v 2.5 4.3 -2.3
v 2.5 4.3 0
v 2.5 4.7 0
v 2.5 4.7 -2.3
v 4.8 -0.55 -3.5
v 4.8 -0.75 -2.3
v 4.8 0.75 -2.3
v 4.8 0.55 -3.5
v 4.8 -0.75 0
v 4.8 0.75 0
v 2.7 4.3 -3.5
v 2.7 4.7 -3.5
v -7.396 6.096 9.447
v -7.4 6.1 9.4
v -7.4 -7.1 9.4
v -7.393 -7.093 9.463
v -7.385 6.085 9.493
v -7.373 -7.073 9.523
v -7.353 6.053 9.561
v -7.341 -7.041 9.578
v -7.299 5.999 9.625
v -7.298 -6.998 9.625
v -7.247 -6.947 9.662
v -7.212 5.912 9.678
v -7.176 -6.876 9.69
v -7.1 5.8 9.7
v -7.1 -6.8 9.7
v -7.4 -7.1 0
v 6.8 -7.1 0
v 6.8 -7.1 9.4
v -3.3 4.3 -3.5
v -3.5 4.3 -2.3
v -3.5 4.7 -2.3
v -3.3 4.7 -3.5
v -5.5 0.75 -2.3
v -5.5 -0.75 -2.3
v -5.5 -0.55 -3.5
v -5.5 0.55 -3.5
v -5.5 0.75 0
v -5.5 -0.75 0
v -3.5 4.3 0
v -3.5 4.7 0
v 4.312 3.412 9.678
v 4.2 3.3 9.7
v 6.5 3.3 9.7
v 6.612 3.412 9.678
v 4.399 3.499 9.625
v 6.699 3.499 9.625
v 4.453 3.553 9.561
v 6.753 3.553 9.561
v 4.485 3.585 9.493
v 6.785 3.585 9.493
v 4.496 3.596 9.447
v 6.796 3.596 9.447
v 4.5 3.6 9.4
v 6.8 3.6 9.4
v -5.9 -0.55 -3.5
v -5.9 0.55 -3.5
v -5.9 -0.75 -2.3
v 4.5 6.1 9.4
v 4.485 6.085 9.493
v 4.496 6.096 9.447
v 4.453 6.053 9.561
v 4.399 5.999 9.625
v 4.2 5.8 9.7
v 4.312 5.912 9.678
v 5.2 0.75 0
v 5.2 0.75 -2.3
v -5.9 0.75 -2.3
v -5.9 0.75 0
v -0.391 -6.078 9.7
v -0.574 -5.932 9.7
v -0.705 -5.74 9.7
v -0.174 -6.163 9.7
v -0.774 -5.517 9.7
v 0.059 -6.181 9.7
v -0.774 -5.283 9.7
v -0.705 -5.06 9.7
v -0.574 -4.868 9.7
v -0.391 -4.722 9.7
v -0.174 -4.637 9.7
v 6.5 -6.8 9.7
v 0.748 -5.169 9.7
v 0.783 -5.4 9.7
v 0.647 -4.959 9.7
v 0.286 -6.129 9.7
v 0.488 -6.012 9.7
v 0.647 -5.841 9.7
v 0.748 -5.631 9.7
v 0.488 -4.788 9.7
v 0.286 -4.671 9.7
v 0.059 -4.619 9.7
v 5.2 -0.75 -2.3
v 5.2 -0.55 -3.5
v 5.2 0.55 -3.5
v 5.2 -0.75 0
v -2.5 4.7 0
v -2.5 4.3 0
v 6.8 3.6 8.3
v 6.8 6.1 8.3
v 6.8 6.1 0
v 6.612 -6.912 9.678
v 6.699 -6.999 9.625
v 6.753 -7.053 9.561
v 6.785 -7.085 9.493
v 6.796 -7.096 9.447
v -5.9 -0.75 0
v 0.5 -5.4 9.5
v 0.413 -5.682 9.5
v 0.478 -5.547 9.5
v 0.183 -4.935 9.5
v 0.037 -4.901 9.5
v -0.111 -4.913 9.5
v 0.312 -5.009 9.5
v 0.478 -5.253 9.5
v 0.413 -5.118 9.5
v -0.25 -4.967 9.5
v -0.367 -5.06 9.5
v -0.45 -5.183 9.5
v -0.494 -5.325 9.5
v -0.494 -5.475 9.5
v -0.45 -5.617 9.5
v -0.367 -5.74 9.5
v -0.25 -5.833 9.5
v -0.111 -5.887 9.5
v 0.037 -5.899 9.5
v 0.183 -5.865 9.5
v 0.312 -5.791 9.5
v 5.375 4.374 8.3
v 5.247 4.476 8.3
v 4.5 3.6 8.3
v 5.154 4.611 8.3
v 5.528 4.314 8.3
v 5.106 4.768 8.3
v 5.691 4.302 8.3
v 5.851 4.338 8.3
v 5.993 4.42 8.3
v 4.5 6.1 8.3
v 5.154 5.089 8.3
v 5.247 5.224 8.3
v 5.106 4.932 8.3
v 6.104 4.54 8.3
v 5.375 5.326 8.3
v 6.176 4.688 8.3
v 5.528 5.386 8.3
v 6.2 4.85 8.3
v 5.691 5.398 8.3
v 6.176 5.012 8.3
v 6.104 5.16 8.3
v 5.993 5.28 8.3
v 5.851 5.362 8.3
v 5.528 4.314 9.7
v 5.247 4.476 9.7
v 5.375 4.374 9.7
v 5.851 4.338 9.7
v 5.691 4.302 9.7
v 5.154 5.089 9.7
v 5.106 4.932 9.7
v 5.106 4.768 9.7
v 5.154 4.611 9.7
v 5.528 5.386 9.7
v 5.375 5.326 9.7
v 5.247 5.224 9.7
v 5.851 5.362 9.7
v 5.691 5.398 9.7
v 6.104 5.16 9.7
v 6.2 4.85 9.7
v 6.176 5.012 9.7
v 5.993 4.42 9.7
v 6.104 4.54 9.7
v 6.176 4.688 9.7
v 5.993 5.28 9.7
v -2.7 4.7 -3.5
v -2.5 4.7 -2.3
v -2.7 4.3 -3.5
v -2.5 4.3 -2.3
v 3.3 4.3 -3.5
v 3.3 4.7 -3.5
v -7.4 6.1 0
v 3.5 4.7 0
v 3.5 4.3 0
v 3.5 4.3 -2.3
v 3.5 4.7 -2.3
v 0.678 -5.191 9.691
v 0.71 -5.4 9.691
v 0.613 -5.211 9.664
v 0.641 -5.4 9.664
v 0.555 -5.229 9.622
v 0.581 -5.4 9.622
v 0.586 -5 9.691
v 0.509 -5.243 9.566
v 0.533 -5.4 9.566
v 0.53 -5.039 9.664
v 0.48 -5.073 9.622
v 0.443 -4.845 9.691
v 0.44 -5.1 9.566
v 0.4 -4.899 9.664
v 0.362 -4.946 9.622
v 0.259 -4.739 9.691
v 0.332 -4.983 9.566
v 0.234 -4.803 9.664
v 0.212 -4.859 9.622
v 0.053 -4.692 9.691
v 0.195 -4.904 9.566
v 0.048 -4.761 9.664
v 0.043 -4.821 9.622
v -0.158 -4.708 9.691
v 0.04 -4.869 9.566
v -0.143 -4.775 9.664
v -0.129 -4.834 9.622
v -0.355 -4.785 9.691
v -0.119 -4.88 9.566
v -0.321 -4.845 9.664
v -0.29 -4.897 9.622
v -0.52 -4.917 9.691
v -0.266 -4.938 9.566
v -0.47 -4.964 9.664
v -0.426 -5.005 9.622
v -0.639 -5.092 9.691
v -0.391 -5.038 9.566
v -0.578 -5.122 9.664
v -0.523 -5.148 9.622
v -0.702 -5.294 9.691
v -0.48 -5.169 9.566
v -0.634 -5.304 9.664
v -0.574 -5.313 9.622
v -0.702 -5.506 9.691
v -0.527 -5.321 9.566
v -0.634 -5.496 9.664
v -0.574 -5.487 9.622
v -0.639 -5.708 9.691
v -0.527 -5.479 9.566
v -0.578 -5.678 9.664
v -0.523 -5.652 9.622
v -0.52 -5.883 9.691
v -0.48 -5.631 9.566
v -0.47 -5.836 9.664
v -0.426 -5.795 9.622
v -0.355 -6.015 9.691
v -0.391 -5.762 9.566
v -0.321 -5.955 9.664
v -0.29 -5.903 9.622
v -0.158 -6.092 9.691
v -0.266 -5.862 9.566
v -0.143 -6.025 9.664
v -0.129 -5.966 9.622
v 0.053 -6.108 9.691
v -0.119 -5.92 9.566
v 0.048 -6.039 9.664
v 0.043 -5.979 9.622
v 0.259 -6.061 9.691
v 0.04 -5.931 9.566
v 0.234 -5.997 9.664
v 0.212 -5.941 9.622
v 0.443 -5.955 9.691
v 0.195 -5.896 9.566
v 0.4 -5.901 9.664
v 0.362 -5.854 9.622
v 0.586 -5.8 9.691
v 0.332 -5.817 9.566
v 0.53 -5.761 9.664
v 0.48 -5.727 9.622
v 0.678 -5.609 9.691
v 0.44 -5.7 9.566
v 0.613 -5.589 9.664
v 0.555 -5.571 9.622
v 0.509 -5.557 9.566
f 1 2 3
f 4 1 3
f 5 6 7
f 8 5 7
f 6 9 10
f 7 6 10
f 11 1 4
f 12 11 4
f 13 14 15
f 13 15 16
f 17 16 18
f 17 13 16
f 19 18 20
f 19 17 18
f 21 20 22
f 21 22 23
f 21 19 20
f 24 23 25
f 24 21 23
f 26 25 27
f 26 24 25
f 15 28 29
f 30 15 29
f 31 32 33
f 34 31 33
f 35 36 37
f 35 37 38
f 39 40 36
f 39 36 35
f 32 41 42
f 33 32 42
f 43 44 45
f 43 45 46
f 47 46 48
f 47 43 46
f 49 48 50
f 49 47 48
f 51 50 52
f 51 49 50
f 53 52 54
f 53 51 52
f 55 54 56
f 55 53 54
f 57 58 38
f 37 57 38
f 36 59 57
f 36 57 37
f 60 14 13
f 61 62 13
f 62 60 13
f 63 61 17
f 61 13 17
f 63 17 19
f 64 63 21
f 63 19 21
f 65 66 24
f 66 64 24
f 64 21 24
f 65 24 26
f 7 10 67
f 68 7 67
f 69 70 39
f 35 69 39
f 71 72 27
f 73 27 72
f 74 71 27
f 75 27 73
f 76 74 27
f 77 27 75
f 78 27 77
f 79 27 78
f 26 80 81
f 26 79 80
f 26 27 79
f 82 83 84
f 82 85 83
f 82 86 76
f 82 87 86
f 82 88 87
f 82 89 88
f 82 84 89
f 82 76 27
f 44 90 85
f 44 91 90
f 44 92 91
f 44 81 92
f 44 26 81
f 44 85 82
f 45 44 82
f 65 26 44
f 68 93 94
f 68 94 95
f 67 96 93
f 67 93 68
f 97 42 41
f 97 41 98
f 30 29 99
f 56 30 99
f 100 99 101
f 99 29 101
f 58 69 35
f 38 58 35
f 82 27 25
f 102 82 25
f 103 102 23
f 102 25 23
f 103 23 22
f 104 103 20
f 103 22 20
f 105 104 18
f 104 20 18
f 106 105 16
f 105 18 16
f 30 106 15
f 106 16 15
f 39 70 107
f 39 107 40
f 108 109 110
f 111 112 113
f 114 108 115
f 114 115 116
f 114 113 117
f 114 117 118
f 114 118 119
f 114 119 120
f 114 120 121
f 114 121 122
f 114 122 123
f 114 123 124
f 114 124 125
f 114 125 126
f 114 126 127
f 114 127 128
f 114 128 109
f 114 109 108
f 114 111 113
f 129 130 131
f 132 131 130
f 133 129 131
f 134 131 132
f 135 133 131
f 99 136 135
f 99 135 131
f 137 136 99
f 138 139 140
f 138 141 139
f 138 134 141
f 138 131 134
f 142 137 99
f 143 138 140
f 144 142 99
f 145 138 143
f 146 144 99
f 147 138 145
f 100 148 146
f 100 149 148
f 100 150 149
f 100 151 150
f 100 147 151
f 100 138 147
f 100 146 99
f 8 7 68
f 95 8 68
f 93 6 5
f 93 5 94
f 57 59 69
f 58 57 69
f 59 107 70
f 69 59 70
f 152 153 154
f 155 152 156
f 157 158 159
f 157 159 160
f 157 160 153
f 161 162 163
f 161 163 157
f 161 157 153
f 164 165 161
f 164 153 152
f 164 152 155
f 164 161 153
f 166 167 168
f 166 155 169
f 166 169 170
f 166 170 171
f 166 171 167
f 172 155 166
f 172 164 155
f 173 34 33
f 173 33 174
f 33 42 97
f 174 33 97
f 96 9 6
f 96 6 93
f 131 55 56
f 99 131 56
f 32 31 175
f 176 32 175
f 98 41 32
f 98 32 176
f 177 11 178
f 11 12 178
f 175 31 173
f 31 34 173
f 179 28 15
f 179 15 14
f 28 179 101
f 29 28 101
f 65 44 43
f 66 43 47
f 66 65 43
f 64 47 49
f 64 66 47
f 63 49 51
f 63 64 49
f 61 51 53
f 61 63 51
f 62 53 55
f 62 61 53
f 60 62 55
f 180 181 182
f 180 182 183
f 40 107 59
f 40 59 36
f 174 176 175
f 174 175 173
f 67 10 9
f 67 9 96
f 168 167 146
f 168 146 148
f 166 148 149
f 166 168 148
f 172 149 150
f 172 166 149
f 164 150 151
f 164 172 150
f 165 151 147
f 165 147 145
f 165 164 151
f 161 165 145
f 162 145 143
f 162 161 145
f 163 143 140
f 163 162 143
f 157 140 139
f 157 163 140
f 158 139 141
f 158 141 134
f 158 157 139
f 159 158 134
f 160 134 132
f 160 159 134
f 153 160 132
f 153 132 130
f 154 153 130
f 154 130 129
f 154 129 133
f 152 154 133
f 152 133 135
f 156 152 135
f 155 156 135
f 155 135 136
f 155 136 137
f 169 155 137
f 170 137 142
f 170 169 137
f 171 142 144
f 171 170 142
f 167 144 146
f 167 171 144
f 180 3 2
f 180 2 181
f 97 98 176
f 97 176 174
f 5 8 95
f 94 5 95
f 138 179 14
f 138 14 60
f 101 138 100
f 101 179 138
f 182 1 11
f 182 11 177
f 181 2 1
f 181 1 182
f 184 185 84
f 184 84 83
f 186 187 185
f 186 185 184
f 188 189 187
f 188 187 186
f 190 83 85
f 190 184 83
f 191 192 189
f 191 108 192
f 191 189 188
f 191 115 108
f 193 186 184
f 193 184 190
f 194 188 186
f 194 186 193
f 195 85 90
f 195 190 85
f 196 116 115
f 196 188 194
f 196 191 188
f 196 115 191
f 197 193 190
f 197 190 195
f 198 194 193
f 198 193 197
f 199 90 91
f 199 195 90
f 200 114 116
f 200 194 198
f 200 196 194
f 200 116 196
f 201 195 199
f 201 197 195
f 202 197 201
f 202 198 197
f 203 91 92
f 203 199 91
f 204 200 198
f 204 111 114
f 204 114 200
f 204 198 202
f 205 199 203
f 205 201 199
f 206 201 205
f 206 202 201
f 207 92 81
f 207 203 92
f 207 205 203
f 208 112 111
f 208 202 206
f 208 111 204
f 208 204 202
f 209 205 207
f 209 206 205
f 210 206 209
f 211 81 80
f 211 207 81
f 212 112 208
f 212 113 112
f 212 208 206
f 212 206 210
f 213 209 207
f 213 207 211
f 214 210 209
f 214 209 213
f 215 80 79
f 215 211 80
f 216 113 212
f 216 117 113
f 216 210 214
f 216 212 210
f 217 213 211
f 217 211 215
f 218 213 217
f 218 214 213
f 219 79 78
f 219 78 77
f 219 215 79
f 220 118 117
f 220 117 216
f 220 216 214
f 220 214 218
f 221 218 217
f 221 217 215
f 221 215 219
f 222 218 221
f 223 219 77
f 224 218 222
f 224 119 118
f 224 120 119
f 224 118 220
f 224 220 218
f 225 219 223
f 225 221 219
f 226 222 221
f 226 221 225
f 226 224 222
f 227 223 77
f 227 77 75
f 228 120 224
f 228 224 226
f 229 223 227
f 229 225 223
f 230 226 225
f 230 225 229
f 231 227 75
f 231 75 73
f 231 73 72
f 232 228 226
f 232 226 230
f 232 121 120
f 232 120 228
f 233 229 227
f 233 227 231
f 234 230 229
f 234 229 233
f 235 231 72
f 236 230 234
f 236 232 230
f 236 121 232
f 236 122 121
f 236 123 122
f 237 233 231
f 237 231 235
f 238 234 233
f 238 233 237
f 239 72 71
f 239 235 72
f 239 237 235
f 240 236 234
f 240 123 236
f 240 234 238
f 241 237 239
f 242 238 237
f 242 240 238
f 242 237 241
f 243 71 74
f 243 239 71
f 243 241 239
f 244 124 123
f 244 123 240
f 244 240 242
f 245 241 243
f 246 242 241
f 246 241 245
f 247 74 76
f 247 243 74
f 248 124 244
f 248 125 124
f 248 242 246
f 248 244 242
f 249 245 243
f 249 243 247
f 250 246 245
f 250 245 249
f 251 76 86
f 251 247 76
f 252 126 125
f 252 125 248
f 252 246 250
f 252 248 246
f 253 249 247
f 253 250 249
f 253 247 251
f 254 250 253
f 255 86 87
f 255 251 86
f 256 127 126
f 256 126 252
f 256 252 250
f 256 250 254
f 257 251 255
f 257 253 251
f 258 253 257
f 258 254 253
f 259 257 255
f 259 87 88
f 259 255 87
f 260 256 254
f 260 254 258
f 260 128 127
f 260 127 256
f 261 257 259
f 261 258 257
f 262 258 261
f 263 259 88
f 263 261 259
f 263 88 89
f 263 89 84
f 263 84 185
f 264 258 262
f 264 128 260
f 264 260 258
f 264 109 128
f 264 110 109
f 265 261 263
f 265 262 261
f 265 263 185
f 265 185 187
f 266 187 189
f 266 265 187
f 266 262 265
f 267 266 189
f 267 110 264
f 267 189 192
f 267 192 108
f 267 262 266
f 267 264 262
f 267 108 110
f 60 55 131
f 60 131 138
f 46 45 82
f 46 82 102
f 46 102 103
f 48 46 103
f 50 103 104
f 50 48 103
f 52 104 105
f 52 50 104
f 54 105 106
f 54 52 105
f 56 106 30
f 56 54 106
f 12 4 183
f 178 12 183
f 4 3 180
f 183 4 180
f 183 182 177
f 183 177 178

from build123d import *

# Parameters (mm, degrees)
F1_W         = 14.2
F1_H         = 13.2
F2_DEPTH     = 9.7
F0_W         = 0.4
F0_H         = 1.5
F3_DEPTH     = 3.5
F0_W_2       = 1.5
F0_H_2       = 0.4
F0_W_3       = 1
F4_W         = 2.3
F4_H         = 2.5
F4_R         = 0.55
F5_DEPTH     = 1.4
F4_R_2       = 0.5
F6_DEPTH     = 0.2
F7_T1_DEPTH  = 3.25
F7_T3_DEPTH  = 13.4
F7_T5_DEPTH  = 3.05
F7_T7_DEPTH  = 14.7
F7_T9_DEPTH  = 12.2
F7_T11_DEPTH = 15.7
F7_T19_DEPTH = 3.25
F7_T23_DEPTH = 3.05
F8_SIZE2     = 1.2
F8_SIZE      = 0.2
F8_2_SIZE2   = 1.2
F8_2_SIZE    = 0.2
F8_3_SIZE2   = 1.2
F8_3_SIZE    = 0.2
F8_4_SIZE2   = 1.2
F8_4_SIZE    = 0.2
F8_5_SIZE2   = 1.2
F8_5_SIZE    = 0.2


# Not quite as in the source:
# - a fillet or chamfer that OpenCascade refuses, or shapes differently, is made with other operations: its cross-section is extruded or revolved along the edge and cut away or added


with BuildPart() as f2:
    # F1 (on Top) → F2 (new body)
    with BuildSketch(Plane.XY):
        with Locations((-0.3, -0.5)):
            Rectangle(F1_W, F1_H)
    extrude(amount=F2_DEPTH)

    # F4 (on face) → F5 (cut)
    with BuildSketch(Plane.XY.offset(9.7)):
        with Locations((5.65, 4.85)):
            Rectangle(F4_W, F4_H)
        with Locations((5.65, 4.85)):
            Circle(F4_R, mode=Mode.SUBTRACT)
    extrude(amount=-F5_DEPTH, mode=Mode.SUBTRACT)

    # F4 (on face) → F6 (cut)
    with BuildSketch(Plane.XY.offset(9.7)):
        with Locations((0, -5.4)):
            Circle(F4_R_2)
    extrude(amount=-F6_DEPTH, mode=Mode.SUBTRACT)

    # F7: fillet of radius 0.3 on 7 edges, made by hand

    # F7_s2 → F7_t1 (cut)
    with BuildSketch(Plane.XZ.offset(-6.85)):
        with BuildLine():
            ThreePointArc((4.2, 9.7), (4.4121320344, 9.6121320344), (4.5, 9.4))
            Line((4.5, 9.4), (4.5, 9.7))
            Line((4.5, 9.7), (4.2, 9.7))
        make_face()
    extrude(amount=F7_T1_DEPTH, mode=Mode.SUBTRACT)

    # F7_s4 → F7_t3 (cut)
    with BuildSketch(Plane.YZ.offset(-8.15)):
        with BuildLine():
            ThreePointArc((6.1, 9.4), (6.0121320344, 9.6121320344), (5.8, 9.7))
            Line((5.8, 9.7), (6.1, 9.7))
            Line((6.1, 9.7), (6.1, 9.4))
        make_face()
    extrude(amount=F7_T3_DEPTH, mode=Mode.SUBTRACT)

    # F7_s6 → F7_t5 (cut)
    with BuildSketch(Plane.YZ.offset(4.5)):
        with BuildLine():
            ThreePointArc((3.3, 9.7), (3.5121320344, 9.6121320344), (3.6, 9.4))
            Line((3.6, 9.4), (3.6, 9.7))
            Line((3.6, 9.7), (3.3, 9.7))
        make_face()
    extrude(amount=F7_T5_DEPTH, mode=Mode.SUBTRACT)

    # F7_s8 → F7_t7 (cut)
    with BuildSketch(Plane.XZ.offset(-6.85)):
        with BuildLine():
            ThreePointArc((-7.4, 9.4), (-7.3121320344, 9.6121320344), (-7.1, 9.7))
            Line((-7.1, 9.7), (-7.4, 9.7))
            Line((-7.4, 9.7), (-7.4, 9.4))
        make_face()
    extrude(amount=F7_T7_DEPTH, mode=Mode.SUBTRACT)

    # F7_s10 → F7_t9 (cut)
    with BuildSketch(Plane.XZ.offset(-4.35)):
        with BuildLine():
            ThreePointArc((6.5, 9.7), (6.7121320344, 9.6121320344), (6.8, 9.4))
            Line((6.8, 9.4), (6.8, 9.7))
            Line((6.8, 9.7), (6.5, 9.7))
        make_face()
    extrude(amount=F7_T9_DEPTH, mode=Mode.SUBTRACT)

    # F7_s12 → F7_t11 (cut)
    with BuildSketch(Plane.YZ.offset(-8.15)):
        with BuildLine():
            ThreePointArc((-6.8, 9.7), (-7.0121320344, 9.6121320344), (-7.1, 9.4))
            Line((-7.1, 9.4), (-7.1, 9.7))
            Line((-7.1, 9.7), (-6.8, 9.7))
        make_face()
    extrude(amount=F7_T11_DEPTH, mode=Mode.SUBTRACT)

    # F7_s13 → F7_t14 (revolve, cut)
    with BuildSketch(Plane.XZ.offset(5.4)):
        with BuildLine():
            ThreePointArc((0.7828427125, 9.7), (0.6096376317, 9.6449489743), (0.5, 9.5))
            Line((0.5, 9.5), (0.5, 9.7))
            Line((0.5, 9.7), (0.7828427125, 9.7))
        make_face()
    revolve(axis=Axis((0, -5.4, 9.7), (0, 0, 1)), mode=Mode.SUBTRACT)


with BuildPart() as f3:
    # F0 (on Top) → F3 (new body)
    with BuildSketch(Plane.XY):
        with Locations((-5.7, 0)):
            Rectangle(F0_W, F0_H)
    extrude(amount=-F3_DEPTH)

    # F8
    f8_edges = [f3.edges().sort_by_distance(p)[0] for p in [
        (-5.7, -0.75, -3.5),
        (-5.7, 0.75, -3.5),
    ]]
    f8_side = f3.faces().sort_by_distance((-5.7, 0, -3.5))[0]
    chamfer(f8_edges, length=F8_SIZE, length2=F8_SIZE2, reference=f8_side)


with BuildPart() as f3b:
    # F0 (on Top) → F3, piece 2 (new body)
    with BuildSketch(Plane.XY):
        with Locations((5, 0)):
            Rectangle(F0_W, F0_H)
    extrude(amount=-F3_DEPTH)

    # F8#5
    f8_5_edges = [f3b.edges().sort_by_distance(p)[0] for p in [
        (5, -0.75, -3.5),
        (5, 0.75, -3.5),
    ]]
    f8_5_side = f3b.faces().sort_by_distance((5, 0, -3.5))[0]
    chamfer(f8_5_edges, length=F8_5_SIZE, length2=F8_5_SIZE2, reference=f8_5_side)


with BuildPart() as f3c:
    # F0 (on Top) → F3, piece 3 (new body)
    with BuildSketch(Plane.XY):
        with Locations((0, -5.4)):
            Rectangle(F0_W_2, F0_H_2)
    extrude(amount=-F3_DEPTH)

    # F8#2
    f8_2_edges = [f3c.edges().sort_by_distance(p)[0] for p in [
        (0.75, -5.4, -3.5),
        (-0.75, -5.4, -3.5),
    ]]
    f8_2_side = f3c.faces().sort_by_distance((0, -5.4, -3.5))[0]
    chamfer(f8_2_edges, length=F8_2_SIZE, length2=F8_2_SIZE2, reference=f8_2_side)


with BuildPart() as f3d:
    # F0 (on Top) → F3, piece 4 (new body)
    with BuildSketch(Plane.XY):
        with Locations((-3, 4.5)):
            Rectangle(F0_W_3, F0_H_2)
    extrude(amount=-F3_DEPTH)

    # F8#3
    f8_3_edges = [f3d.edges().sort_by_distance(p)[0] for p in [
        (-2.5, 4.5, -3.5),
        (-3.5, 4.5, -3.5),
    ]]
    f8_3_side = f3d.faces().sort_by_distance((-3, 4.5, -3.5))[0]
    chamfer(f8_3_edges, length=F8_3_SIZE, length2=F8_3_SIZE2, reference=f8_3_side)


with BuildPart() as f3e:
    # F0 (on Top) → F3, piece 5 (new body)
    with BuildSketch(Plane.XY):
        with Locations((3, 4.5)):
            Rectangle(F0_W_3, F0_H_2)
    extrude(amount=-F3_DEPTH)

    # F8#4
    f8_4_edges = [f3e.edges().sort_by_distance(p)[0] for p in [
        (2.5, 4.5, -3.5),
        (3.5, 4.5, -3.5),
    ]]
    f8_4_side = f3e.faces().sort_by_distance((3, 4.5, -3.5))[0]
    chamfer(f8_4_edges, length=F8_4_SIZE, length2=F8_4_SIZE2, reference=f8_4_side)


with BuildPart() as f7_tool17:
    # F7_s18 → F7_t19 (new body)
    with BuildSketch(Plane.XZ.offset(-6.1)):
        with BuildLine():
            ThreePointArc((4.2, 9.7), (4.4121320344, 9.6121320344), (4.5, 9.4))
            Line((4.5, 9.4), (4.5, 9.7))
            Line((4.5, 9.7), (4.2, 9.7))
        make_face()
    extrude(amount=F7_T19_DEPTH)

    split(bisect_by=Plane.XZ.offset(-3.6), keep=Keep.TOP)


with BuildPart() as f7_tool21:
    # F7_s22 → F7_t23 (new body)
    with BuildSketch(Plane.YZ.offset(3.75)):
        with BuildLine():
            ThreePointArc((3.3, 9.7), (3.5121320344, 9.6121320344), (3.6, 9.4))
            Line((3.6, 9.4), (3.6, 9.7))
            Line((3.6, 9.7), (3.3, 9.7))
        make_face()
    extrude(amount=F7_T23_DEPTH)

    split(bisect_by=Plane.YZ.offset(4.5), keep=Keep.BOTTOM)


with BuildPart() as f7_tool17_1:
    add(f7_tool17.part)

    # F7_t25: intersect F7_tool21
    add(f7_tool21.part, mode=Mode.INTERSECT)


with BuildPart() as f2_1:
    add(f2.part)

    # F7_t15: cut F7_tool17
    add(f7_tool17_1.part, mode=Mode.SUBTRACT)


solid = Compound([f3.part, f3b.part, f3d.part, f3e.part, f2_1.part])
